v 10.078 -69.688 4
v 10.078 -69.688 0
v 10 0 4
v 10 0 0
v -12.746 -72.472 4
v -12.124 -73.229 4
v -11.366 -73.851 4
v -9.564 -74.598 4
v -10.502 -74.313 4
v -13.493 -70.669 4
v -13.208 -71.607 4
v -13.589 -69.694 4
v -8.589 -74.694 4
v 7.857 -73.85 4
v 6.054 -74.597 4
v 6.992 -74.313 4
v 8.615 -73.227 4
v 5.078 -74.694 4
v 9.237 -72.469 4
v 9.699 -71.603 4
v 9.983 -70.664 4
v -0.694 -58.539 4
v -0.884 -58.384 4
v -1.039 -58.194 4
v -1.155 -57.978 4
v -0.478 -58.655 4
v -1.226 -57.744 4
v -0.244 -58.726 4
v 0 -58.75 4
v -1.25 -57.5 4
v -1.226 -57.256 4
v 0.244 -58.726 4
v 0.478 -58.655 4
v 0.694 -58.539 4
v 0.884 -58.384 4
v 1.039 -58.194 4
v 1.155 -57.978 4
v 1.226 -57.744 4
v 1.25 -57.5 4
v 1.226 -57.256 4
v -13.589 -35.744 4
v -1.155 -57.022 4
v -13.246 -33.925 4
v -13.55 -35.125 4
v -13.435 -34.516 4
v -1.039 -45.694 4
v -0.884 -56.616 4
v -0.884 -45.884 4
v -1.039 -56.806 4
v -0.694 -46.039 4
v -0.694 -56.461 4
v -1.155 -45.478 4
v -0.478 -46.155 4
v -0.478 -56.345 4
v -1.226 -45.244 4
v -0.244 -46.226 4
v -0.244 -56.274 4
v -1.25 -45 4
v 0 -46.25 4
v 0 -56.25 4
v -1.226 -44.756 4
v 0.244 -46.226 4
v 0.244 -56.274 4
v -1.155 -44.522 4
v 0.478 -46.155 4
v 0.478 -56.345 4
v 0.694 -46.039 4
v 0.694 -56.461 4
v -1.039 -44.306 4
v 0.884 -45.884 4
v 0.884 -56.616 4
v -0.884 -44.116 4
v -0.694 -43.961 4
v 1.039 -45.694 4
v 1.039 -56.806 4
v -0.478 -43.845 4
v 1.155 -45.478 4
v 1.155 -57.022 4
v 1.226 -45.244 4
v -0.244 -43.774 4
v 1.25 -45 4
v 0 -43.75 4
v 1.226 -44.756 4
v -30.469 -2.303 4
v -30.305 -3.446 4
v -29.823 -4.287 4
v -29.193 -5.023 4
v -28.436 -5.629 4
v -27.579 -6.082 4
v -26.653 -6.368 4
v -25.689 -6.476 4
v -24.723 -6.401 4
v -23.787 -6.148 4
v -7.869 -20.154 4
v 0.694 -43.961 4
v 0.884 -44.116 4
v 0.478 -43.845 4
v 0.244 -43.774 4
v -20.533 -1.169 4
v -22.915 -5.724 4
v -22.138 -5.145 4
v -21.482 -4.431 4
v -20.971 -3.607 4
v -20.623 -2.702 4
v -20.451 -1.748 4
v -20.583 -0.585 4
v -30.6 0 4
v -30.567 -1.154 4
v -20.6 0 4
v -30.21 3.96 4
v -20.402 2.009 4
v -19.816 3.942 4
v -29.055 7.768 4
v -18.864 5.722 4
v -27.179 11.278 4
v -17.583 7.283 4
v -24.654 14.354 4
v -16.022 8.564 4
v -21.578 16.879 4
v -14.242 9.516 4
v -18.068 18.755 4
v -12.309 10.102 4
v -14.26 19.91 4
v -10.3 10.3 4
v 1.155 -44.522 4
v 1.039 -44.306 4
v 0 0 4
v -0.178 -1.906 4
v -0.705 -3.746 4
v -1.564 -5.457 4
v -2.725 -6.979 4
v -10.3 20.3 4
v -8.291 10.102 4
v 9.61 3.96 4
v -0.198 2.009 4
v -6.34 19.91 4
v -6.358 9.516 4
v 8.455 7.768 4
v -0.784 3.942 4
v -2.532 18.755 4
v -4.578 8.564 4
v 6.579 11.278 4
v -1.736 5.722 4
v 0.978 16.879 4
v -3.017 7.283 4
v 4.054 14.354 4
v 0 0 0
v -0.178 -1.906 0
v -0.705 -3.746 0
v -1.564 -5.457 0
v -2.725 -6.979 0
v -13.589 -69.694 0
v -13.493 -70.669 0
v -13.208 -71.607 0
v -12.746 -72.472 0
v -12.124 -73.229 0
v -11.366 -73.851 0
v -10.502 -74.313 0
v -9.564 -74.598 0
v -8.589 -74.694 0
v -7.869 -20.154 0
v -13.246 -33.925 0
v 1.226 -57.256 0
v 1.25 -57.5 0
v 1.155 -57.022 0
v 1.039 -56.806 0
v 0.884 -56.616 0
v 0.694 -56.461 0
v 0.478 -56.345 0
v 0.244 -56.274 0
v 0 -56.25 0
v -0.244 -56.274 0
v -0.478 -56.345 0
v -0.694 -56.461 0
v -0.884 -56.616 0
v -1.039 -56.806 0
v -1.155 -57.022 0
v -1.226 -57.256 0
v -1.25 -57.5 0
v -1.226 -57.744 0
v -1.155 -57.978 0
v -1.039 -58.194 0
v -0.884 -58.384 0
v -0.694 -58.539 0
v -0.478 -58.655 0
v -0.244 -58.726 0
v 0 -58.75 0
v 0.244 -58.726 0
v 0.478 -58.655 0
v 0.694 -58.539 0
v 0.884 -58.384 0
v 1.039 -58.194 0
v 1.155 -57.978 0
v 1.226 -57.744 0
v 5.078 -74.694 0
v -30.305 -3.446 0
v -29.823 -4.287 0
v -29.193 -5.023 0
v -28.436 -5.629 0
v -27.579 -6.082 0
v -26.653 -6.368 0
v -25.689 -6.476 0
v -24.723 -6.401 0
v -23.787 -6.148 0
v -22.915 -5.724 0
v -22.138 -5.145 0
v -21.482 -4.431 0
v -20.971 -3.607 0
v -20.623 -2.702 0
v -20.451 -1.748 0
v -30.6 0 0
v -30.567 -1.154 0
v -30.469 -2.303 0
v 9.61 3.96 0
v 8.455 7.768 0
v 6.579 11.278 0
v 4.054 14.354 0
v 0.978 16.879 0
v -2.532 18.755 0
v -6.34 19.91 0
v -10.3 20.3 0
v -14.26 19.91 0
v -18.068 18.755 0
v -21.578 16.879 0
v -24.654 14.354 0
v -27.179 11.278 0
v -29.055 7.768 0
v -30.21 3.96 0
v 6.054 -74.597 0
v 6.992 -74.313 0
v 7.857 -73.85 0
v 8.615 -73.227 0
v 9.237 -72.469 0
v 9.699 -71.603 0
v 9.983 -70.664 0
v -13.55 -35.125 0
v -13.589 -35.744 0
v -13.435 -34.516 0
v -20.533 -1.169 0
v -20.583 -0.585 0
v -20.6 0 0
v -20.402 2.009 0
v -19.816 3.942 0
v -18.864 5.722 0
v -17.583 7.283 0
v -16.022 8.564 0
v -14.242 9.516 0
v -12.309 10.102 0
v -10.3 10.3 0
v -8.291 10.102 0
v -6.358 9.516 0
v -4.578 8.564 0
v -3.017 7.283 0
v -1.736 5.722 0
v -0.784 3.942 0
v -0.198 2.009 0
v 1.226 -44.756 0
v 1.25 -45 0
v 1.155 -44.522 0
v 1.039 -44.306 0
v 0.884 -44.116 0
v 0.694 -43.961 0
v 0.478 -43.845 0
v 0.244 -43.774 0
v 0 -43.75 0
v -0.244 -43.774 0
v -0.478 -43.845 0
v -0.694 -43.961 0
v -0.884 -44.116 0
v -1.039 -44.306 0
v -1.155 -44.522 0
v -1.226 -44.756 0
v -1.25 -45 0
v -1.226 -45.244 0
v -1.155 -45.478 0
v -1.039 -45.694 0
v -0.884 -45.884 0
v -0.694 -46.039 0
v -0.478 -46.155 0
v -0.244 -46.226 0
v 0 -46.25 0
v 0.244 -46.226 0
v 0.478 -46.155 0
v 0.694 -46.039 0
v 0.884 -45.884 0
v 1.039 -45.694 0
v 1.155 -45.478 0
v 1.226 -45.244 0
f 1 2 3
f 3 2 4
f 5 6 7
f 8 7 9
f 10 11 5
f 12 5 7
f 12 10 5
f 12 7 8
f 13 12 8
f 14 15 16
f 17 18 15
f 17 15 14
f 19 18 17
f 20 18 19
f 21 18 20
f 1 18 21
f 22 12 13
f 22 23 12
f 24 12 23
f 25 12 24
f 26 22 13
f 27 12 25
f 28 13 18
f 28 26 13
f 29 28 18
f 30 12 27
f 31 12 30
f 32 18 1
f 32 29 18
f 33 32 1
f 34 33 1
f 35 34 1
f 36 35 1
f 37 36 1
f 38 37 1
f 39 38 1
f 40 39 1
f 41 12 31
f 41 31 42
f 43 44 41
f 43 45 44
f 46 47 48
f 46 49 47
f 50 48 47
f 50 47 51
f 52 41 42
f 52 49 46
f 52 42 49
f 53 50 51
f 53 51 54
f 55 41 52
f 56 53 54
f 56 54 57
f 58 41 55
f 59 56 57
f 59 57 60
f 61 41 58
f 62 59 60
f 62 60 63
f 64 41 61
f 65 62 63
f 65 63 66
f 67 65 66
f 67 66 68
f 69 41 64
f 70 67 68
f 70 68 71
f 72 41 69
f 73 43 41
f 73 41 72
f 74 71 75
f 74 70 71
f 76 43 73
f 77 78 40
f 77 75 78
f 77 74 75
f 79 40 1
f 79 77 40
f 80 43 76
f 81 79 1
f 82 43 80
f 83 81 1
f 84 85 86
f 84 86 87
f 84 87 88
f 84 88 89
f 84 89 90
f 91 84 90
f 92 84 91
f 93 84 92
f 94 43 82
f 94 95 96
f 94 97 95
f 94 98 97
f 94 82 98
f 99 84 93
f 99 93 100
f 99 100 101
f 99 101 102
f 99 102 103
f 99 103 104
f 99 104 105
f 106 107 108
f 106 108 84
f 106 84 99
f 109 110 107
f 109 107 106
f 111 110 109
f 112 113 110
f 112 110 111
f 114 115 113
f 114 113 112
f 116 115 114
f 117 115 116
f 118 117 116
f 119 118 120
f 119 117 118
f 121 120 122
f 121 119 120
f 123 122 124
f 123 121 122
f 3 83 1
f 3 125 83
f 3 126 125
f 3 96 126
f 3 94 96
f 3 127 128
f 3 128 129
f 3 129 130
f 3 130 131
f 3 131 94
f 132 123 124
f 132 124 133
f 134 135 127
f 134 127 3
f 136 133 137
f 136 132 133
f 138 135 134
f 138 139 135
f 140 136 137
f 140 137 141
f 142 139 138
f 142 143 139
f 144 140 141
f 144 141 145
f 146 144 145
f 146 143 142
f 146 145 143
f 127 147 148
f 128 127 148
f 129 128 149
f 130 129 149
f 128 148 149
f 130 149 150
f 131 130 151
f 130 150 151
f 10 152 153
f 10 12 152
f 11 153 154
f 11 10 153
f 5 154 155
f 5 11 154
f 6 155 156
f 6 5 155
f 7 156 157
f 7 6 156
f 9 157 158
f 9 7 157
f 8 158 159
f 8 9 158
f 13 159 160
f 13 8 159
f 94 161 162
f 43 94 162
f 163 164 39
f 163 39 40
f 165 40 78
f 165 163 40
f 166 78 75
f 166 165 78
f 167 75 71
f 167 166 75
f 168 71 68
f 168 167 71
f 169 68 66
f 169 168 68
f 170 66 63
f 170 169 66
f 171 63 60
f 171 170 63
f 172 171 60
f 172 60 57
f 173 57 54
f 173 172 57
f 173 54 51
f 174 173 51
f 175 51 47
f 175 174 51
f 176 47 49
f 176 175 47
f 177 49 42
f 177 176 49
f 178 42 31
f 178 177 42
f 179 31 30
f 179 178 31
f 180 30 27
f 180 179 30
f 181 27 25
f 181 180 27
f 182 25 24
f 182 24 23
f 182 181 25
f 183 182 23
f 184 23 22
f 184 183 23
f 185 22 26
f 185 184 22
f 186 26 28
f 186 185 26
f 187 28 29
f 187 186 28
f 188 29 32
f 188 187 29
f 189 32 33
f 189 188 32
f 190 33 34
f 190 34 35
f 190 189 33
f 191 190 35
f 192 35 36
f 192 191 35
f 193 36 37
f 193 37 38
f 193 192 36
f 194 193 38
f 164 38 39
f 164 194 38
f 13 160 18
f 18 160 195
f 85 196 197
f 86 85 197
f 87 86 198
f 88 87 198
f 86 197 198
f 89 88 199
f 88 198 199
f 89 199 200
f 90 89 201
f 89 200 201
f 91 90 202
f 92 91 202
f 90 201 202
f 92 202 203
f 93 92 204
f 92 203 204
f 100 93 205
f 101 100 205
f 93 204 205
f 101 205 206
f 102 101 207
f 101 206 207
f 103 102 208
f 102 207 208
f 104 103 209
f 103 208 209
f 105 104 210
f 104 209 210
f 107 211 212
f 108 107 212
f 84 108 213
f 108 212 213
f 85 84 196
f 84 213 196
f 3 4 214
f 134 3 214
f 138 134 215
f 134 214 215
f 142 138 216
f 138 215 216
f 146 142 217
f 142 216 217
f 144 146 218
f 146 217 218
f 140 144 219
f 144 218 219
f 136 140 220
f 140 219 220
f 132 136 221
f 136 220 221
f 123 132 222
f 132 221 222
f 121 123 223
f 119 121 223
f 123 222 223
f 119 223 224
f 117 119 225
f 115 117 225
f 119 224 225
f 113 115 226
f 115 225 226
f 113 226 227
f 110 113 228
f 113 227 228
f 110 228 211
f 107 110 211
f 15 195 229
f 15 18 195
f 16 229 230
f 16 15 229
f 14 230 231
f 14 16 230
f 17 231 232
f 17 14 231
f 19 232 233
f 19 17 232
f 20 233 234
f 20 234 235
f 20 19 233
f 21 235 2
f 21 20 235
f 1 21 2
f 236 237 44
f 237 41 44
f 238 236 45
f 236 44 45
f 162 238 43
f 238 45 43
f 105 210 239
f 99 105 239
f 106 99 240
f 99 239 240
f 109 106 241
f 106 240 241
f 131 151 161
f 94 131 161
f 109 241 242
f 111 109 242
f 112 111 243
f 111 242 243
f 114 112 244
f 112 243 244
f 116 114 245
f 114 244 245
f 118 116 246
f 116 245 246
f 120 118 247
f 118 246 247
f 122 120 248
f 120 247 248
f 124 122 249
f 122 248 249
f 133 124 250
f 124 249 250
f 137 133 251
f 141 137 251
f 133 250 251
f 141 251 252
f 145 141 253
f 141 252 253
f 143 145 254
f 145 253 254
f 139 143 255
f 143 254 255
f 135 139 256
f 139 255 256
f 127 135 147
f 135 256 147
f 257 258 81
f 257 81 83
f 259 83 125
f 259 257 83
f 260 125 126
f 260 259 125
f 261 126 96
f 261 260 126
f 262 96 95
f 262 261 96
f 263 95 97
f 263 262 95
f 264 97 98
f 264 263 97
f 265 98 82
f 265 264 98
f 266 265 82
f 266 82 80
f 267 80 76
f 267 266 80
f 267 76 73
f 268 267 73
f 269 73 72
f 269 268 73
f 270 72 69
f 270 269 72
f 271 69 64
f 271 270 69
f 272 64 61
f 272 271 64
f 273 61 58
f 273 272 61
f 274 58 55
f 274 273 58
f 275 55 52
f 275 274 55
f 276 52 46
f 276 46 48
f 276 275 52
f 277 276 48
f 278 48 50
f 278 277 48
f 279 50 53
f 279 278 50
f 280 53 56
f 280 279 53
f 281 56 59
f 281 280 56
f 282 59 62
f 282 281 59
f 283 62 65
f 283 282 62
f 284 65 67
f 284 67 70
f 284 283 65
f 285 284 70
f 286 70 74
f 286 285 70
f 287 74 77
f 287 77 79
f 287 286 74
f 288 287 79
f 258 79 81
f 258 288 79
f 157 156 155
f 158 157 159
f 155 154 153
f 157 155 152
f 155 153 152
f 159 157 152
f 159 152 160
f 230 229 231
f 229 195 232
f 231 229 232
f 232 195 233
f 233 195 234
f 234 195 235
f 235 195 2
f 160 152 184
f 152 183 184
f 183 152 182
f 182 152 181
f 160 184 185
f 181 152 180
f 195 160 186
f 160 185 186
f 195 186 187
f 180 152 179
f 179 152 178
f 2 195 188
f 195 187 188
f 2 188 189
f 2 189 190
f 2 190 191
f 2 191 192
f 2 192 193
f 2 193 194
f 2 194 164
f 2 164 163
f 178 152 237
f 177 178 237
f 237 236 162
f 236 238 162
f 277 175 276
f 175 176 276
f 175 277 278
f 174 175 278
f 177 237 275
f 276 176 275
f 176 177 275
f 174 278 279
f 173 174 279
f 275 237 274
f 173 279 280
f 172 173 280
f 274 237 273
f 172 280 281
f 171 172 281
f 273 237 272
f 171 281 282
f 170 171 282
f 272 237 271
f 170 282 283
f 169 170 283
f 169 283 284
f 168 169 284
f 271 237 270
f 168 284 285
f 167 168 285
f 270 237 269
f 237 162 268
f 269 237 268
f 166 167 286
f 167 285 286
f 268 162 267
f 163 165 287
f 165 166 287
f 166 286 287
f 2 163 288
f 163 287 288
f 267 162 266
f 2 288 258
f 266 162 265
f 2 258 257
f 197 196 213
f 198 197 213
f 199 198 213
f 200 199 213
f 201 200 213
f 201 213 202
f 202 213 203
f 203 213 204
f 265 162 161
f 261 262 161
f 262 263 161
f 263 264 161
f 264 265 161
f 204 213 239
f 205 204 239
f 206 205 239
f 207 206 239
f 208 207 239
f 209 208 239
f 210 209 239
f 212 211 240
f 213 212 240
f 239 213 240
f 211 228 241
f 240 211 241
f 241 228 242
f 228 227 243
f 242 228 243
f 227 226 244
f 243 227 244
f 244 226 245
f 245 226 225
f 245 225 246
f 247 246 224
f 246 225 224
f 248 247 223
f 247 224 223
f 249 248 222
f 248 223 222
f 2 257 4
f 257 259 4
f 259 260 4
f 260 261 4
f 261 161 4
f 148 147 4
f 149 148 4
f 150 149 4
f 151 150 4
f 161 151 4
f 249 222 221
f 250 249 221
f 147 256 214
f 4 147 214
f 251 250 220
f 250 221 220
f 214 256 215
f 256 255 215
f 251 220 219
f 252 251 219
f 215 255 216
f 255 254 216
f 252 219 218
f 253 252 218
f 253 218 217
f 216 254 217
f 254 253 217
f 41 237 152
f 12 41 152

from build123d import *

# Parameters (mm, degrees)
F0_R     = 1.25
F1_DEPTH = 4
F2_R     = 5
F3_R     = 5
F4_R     = 5


# Not quite as in the source:
# - ends of sketch curves that miss each other by under 0.0002 mm in the source are joined


with BuildPart() as f1:
    # F0 (on Top) → F1 (new body)
    with BuildSketch(Plane.XY):
        with BuildLine():
            ThreePointArc((-20.6, 0), (-10.3, 10.3), (0, 0))
            ThreePointArc((0, 0), (-0.7054288039, -3.746225242), (-2.7250880706, -6.9793057865))
            Line((-2.7250880706, -6.9793057865), (-7.8691552748, -20.1539324679))
            ThreePointArc((-7.8691552748, -20.1539324679), (4.8894066362, -13.467439476), (10, 0))
            ThreePointArc((10, 0), (-10.3, 20.3), (-30.6, 0))
            ThreePointArc((-30.6, 0), (-25.6, 3.8602209978), (-20.6, 0))
        make_face()
        with BuildLine():
            ThreePointArc((-20.4505253001, -1.748381003), (-20.5625632907, -0.8773794529), (-20.6, 0))
            ThreePointArc((-20.6, 0), (-25.6, 3.8602209978), (-30.6, 0))
            ThreePointArc((-30.6, 0), (-30.526216971, -1.7292041645), (-30.3054042323, -3.4458382874))
            ThreePointArc((-30.3054042323, -3.4458382874), (-24.722708741, -6.4013107037), (-20.4505253001, -1.748381003))
        make_face()
        with BuildLine():
            ThreePointArc((10, 0), (4.8894066362, -13.467439476), (-7.8691552748, -20.1539324679))
            Line((-7.8691552748, -20.1539324679), (-13.5885840282, -34.8021350801))
            Line((-13.5885840282, -34.8021350801), (-13.5885840282, -74.6936649084))
            Line((-13.5885840282, -74.6936649084), (10.083315894, -74.6936649084))
            Line((10.083315894, -74.6936649084), (10, 0))
        make_face()
        with Locations((0, -57.5)):
            Circle(F0_R, mode=Mode.SUBTRACT)
        with Locations((0, -45)):
            Circle(F0_R, mode=Mode.SUBTRACT)
    extrude(amount=F1_DEPTH)

    # F2
    f2_edges = [f1.edges().sort_by_distance(p)[0] for p in [
        (-13.588584, -74.693665, 2),
    ]]
    fillet(f2_edges, radius=F2_R)

    # F3
    f3_edges = [f1.edges().sort_by_distance(p)[0] for p in [
        (10.083316, -74.693665, 2),
    ]]
    fillet(f3_edges, radius=F3_R)

    # F4
    f4_edges = [f1.edges().sort_by_distance(p)[0] for p in [
        (-13.588584, -34.802135, 2),
    ]]
    fillet(f4_edges, radius=F4_R)


solid = f1.part
